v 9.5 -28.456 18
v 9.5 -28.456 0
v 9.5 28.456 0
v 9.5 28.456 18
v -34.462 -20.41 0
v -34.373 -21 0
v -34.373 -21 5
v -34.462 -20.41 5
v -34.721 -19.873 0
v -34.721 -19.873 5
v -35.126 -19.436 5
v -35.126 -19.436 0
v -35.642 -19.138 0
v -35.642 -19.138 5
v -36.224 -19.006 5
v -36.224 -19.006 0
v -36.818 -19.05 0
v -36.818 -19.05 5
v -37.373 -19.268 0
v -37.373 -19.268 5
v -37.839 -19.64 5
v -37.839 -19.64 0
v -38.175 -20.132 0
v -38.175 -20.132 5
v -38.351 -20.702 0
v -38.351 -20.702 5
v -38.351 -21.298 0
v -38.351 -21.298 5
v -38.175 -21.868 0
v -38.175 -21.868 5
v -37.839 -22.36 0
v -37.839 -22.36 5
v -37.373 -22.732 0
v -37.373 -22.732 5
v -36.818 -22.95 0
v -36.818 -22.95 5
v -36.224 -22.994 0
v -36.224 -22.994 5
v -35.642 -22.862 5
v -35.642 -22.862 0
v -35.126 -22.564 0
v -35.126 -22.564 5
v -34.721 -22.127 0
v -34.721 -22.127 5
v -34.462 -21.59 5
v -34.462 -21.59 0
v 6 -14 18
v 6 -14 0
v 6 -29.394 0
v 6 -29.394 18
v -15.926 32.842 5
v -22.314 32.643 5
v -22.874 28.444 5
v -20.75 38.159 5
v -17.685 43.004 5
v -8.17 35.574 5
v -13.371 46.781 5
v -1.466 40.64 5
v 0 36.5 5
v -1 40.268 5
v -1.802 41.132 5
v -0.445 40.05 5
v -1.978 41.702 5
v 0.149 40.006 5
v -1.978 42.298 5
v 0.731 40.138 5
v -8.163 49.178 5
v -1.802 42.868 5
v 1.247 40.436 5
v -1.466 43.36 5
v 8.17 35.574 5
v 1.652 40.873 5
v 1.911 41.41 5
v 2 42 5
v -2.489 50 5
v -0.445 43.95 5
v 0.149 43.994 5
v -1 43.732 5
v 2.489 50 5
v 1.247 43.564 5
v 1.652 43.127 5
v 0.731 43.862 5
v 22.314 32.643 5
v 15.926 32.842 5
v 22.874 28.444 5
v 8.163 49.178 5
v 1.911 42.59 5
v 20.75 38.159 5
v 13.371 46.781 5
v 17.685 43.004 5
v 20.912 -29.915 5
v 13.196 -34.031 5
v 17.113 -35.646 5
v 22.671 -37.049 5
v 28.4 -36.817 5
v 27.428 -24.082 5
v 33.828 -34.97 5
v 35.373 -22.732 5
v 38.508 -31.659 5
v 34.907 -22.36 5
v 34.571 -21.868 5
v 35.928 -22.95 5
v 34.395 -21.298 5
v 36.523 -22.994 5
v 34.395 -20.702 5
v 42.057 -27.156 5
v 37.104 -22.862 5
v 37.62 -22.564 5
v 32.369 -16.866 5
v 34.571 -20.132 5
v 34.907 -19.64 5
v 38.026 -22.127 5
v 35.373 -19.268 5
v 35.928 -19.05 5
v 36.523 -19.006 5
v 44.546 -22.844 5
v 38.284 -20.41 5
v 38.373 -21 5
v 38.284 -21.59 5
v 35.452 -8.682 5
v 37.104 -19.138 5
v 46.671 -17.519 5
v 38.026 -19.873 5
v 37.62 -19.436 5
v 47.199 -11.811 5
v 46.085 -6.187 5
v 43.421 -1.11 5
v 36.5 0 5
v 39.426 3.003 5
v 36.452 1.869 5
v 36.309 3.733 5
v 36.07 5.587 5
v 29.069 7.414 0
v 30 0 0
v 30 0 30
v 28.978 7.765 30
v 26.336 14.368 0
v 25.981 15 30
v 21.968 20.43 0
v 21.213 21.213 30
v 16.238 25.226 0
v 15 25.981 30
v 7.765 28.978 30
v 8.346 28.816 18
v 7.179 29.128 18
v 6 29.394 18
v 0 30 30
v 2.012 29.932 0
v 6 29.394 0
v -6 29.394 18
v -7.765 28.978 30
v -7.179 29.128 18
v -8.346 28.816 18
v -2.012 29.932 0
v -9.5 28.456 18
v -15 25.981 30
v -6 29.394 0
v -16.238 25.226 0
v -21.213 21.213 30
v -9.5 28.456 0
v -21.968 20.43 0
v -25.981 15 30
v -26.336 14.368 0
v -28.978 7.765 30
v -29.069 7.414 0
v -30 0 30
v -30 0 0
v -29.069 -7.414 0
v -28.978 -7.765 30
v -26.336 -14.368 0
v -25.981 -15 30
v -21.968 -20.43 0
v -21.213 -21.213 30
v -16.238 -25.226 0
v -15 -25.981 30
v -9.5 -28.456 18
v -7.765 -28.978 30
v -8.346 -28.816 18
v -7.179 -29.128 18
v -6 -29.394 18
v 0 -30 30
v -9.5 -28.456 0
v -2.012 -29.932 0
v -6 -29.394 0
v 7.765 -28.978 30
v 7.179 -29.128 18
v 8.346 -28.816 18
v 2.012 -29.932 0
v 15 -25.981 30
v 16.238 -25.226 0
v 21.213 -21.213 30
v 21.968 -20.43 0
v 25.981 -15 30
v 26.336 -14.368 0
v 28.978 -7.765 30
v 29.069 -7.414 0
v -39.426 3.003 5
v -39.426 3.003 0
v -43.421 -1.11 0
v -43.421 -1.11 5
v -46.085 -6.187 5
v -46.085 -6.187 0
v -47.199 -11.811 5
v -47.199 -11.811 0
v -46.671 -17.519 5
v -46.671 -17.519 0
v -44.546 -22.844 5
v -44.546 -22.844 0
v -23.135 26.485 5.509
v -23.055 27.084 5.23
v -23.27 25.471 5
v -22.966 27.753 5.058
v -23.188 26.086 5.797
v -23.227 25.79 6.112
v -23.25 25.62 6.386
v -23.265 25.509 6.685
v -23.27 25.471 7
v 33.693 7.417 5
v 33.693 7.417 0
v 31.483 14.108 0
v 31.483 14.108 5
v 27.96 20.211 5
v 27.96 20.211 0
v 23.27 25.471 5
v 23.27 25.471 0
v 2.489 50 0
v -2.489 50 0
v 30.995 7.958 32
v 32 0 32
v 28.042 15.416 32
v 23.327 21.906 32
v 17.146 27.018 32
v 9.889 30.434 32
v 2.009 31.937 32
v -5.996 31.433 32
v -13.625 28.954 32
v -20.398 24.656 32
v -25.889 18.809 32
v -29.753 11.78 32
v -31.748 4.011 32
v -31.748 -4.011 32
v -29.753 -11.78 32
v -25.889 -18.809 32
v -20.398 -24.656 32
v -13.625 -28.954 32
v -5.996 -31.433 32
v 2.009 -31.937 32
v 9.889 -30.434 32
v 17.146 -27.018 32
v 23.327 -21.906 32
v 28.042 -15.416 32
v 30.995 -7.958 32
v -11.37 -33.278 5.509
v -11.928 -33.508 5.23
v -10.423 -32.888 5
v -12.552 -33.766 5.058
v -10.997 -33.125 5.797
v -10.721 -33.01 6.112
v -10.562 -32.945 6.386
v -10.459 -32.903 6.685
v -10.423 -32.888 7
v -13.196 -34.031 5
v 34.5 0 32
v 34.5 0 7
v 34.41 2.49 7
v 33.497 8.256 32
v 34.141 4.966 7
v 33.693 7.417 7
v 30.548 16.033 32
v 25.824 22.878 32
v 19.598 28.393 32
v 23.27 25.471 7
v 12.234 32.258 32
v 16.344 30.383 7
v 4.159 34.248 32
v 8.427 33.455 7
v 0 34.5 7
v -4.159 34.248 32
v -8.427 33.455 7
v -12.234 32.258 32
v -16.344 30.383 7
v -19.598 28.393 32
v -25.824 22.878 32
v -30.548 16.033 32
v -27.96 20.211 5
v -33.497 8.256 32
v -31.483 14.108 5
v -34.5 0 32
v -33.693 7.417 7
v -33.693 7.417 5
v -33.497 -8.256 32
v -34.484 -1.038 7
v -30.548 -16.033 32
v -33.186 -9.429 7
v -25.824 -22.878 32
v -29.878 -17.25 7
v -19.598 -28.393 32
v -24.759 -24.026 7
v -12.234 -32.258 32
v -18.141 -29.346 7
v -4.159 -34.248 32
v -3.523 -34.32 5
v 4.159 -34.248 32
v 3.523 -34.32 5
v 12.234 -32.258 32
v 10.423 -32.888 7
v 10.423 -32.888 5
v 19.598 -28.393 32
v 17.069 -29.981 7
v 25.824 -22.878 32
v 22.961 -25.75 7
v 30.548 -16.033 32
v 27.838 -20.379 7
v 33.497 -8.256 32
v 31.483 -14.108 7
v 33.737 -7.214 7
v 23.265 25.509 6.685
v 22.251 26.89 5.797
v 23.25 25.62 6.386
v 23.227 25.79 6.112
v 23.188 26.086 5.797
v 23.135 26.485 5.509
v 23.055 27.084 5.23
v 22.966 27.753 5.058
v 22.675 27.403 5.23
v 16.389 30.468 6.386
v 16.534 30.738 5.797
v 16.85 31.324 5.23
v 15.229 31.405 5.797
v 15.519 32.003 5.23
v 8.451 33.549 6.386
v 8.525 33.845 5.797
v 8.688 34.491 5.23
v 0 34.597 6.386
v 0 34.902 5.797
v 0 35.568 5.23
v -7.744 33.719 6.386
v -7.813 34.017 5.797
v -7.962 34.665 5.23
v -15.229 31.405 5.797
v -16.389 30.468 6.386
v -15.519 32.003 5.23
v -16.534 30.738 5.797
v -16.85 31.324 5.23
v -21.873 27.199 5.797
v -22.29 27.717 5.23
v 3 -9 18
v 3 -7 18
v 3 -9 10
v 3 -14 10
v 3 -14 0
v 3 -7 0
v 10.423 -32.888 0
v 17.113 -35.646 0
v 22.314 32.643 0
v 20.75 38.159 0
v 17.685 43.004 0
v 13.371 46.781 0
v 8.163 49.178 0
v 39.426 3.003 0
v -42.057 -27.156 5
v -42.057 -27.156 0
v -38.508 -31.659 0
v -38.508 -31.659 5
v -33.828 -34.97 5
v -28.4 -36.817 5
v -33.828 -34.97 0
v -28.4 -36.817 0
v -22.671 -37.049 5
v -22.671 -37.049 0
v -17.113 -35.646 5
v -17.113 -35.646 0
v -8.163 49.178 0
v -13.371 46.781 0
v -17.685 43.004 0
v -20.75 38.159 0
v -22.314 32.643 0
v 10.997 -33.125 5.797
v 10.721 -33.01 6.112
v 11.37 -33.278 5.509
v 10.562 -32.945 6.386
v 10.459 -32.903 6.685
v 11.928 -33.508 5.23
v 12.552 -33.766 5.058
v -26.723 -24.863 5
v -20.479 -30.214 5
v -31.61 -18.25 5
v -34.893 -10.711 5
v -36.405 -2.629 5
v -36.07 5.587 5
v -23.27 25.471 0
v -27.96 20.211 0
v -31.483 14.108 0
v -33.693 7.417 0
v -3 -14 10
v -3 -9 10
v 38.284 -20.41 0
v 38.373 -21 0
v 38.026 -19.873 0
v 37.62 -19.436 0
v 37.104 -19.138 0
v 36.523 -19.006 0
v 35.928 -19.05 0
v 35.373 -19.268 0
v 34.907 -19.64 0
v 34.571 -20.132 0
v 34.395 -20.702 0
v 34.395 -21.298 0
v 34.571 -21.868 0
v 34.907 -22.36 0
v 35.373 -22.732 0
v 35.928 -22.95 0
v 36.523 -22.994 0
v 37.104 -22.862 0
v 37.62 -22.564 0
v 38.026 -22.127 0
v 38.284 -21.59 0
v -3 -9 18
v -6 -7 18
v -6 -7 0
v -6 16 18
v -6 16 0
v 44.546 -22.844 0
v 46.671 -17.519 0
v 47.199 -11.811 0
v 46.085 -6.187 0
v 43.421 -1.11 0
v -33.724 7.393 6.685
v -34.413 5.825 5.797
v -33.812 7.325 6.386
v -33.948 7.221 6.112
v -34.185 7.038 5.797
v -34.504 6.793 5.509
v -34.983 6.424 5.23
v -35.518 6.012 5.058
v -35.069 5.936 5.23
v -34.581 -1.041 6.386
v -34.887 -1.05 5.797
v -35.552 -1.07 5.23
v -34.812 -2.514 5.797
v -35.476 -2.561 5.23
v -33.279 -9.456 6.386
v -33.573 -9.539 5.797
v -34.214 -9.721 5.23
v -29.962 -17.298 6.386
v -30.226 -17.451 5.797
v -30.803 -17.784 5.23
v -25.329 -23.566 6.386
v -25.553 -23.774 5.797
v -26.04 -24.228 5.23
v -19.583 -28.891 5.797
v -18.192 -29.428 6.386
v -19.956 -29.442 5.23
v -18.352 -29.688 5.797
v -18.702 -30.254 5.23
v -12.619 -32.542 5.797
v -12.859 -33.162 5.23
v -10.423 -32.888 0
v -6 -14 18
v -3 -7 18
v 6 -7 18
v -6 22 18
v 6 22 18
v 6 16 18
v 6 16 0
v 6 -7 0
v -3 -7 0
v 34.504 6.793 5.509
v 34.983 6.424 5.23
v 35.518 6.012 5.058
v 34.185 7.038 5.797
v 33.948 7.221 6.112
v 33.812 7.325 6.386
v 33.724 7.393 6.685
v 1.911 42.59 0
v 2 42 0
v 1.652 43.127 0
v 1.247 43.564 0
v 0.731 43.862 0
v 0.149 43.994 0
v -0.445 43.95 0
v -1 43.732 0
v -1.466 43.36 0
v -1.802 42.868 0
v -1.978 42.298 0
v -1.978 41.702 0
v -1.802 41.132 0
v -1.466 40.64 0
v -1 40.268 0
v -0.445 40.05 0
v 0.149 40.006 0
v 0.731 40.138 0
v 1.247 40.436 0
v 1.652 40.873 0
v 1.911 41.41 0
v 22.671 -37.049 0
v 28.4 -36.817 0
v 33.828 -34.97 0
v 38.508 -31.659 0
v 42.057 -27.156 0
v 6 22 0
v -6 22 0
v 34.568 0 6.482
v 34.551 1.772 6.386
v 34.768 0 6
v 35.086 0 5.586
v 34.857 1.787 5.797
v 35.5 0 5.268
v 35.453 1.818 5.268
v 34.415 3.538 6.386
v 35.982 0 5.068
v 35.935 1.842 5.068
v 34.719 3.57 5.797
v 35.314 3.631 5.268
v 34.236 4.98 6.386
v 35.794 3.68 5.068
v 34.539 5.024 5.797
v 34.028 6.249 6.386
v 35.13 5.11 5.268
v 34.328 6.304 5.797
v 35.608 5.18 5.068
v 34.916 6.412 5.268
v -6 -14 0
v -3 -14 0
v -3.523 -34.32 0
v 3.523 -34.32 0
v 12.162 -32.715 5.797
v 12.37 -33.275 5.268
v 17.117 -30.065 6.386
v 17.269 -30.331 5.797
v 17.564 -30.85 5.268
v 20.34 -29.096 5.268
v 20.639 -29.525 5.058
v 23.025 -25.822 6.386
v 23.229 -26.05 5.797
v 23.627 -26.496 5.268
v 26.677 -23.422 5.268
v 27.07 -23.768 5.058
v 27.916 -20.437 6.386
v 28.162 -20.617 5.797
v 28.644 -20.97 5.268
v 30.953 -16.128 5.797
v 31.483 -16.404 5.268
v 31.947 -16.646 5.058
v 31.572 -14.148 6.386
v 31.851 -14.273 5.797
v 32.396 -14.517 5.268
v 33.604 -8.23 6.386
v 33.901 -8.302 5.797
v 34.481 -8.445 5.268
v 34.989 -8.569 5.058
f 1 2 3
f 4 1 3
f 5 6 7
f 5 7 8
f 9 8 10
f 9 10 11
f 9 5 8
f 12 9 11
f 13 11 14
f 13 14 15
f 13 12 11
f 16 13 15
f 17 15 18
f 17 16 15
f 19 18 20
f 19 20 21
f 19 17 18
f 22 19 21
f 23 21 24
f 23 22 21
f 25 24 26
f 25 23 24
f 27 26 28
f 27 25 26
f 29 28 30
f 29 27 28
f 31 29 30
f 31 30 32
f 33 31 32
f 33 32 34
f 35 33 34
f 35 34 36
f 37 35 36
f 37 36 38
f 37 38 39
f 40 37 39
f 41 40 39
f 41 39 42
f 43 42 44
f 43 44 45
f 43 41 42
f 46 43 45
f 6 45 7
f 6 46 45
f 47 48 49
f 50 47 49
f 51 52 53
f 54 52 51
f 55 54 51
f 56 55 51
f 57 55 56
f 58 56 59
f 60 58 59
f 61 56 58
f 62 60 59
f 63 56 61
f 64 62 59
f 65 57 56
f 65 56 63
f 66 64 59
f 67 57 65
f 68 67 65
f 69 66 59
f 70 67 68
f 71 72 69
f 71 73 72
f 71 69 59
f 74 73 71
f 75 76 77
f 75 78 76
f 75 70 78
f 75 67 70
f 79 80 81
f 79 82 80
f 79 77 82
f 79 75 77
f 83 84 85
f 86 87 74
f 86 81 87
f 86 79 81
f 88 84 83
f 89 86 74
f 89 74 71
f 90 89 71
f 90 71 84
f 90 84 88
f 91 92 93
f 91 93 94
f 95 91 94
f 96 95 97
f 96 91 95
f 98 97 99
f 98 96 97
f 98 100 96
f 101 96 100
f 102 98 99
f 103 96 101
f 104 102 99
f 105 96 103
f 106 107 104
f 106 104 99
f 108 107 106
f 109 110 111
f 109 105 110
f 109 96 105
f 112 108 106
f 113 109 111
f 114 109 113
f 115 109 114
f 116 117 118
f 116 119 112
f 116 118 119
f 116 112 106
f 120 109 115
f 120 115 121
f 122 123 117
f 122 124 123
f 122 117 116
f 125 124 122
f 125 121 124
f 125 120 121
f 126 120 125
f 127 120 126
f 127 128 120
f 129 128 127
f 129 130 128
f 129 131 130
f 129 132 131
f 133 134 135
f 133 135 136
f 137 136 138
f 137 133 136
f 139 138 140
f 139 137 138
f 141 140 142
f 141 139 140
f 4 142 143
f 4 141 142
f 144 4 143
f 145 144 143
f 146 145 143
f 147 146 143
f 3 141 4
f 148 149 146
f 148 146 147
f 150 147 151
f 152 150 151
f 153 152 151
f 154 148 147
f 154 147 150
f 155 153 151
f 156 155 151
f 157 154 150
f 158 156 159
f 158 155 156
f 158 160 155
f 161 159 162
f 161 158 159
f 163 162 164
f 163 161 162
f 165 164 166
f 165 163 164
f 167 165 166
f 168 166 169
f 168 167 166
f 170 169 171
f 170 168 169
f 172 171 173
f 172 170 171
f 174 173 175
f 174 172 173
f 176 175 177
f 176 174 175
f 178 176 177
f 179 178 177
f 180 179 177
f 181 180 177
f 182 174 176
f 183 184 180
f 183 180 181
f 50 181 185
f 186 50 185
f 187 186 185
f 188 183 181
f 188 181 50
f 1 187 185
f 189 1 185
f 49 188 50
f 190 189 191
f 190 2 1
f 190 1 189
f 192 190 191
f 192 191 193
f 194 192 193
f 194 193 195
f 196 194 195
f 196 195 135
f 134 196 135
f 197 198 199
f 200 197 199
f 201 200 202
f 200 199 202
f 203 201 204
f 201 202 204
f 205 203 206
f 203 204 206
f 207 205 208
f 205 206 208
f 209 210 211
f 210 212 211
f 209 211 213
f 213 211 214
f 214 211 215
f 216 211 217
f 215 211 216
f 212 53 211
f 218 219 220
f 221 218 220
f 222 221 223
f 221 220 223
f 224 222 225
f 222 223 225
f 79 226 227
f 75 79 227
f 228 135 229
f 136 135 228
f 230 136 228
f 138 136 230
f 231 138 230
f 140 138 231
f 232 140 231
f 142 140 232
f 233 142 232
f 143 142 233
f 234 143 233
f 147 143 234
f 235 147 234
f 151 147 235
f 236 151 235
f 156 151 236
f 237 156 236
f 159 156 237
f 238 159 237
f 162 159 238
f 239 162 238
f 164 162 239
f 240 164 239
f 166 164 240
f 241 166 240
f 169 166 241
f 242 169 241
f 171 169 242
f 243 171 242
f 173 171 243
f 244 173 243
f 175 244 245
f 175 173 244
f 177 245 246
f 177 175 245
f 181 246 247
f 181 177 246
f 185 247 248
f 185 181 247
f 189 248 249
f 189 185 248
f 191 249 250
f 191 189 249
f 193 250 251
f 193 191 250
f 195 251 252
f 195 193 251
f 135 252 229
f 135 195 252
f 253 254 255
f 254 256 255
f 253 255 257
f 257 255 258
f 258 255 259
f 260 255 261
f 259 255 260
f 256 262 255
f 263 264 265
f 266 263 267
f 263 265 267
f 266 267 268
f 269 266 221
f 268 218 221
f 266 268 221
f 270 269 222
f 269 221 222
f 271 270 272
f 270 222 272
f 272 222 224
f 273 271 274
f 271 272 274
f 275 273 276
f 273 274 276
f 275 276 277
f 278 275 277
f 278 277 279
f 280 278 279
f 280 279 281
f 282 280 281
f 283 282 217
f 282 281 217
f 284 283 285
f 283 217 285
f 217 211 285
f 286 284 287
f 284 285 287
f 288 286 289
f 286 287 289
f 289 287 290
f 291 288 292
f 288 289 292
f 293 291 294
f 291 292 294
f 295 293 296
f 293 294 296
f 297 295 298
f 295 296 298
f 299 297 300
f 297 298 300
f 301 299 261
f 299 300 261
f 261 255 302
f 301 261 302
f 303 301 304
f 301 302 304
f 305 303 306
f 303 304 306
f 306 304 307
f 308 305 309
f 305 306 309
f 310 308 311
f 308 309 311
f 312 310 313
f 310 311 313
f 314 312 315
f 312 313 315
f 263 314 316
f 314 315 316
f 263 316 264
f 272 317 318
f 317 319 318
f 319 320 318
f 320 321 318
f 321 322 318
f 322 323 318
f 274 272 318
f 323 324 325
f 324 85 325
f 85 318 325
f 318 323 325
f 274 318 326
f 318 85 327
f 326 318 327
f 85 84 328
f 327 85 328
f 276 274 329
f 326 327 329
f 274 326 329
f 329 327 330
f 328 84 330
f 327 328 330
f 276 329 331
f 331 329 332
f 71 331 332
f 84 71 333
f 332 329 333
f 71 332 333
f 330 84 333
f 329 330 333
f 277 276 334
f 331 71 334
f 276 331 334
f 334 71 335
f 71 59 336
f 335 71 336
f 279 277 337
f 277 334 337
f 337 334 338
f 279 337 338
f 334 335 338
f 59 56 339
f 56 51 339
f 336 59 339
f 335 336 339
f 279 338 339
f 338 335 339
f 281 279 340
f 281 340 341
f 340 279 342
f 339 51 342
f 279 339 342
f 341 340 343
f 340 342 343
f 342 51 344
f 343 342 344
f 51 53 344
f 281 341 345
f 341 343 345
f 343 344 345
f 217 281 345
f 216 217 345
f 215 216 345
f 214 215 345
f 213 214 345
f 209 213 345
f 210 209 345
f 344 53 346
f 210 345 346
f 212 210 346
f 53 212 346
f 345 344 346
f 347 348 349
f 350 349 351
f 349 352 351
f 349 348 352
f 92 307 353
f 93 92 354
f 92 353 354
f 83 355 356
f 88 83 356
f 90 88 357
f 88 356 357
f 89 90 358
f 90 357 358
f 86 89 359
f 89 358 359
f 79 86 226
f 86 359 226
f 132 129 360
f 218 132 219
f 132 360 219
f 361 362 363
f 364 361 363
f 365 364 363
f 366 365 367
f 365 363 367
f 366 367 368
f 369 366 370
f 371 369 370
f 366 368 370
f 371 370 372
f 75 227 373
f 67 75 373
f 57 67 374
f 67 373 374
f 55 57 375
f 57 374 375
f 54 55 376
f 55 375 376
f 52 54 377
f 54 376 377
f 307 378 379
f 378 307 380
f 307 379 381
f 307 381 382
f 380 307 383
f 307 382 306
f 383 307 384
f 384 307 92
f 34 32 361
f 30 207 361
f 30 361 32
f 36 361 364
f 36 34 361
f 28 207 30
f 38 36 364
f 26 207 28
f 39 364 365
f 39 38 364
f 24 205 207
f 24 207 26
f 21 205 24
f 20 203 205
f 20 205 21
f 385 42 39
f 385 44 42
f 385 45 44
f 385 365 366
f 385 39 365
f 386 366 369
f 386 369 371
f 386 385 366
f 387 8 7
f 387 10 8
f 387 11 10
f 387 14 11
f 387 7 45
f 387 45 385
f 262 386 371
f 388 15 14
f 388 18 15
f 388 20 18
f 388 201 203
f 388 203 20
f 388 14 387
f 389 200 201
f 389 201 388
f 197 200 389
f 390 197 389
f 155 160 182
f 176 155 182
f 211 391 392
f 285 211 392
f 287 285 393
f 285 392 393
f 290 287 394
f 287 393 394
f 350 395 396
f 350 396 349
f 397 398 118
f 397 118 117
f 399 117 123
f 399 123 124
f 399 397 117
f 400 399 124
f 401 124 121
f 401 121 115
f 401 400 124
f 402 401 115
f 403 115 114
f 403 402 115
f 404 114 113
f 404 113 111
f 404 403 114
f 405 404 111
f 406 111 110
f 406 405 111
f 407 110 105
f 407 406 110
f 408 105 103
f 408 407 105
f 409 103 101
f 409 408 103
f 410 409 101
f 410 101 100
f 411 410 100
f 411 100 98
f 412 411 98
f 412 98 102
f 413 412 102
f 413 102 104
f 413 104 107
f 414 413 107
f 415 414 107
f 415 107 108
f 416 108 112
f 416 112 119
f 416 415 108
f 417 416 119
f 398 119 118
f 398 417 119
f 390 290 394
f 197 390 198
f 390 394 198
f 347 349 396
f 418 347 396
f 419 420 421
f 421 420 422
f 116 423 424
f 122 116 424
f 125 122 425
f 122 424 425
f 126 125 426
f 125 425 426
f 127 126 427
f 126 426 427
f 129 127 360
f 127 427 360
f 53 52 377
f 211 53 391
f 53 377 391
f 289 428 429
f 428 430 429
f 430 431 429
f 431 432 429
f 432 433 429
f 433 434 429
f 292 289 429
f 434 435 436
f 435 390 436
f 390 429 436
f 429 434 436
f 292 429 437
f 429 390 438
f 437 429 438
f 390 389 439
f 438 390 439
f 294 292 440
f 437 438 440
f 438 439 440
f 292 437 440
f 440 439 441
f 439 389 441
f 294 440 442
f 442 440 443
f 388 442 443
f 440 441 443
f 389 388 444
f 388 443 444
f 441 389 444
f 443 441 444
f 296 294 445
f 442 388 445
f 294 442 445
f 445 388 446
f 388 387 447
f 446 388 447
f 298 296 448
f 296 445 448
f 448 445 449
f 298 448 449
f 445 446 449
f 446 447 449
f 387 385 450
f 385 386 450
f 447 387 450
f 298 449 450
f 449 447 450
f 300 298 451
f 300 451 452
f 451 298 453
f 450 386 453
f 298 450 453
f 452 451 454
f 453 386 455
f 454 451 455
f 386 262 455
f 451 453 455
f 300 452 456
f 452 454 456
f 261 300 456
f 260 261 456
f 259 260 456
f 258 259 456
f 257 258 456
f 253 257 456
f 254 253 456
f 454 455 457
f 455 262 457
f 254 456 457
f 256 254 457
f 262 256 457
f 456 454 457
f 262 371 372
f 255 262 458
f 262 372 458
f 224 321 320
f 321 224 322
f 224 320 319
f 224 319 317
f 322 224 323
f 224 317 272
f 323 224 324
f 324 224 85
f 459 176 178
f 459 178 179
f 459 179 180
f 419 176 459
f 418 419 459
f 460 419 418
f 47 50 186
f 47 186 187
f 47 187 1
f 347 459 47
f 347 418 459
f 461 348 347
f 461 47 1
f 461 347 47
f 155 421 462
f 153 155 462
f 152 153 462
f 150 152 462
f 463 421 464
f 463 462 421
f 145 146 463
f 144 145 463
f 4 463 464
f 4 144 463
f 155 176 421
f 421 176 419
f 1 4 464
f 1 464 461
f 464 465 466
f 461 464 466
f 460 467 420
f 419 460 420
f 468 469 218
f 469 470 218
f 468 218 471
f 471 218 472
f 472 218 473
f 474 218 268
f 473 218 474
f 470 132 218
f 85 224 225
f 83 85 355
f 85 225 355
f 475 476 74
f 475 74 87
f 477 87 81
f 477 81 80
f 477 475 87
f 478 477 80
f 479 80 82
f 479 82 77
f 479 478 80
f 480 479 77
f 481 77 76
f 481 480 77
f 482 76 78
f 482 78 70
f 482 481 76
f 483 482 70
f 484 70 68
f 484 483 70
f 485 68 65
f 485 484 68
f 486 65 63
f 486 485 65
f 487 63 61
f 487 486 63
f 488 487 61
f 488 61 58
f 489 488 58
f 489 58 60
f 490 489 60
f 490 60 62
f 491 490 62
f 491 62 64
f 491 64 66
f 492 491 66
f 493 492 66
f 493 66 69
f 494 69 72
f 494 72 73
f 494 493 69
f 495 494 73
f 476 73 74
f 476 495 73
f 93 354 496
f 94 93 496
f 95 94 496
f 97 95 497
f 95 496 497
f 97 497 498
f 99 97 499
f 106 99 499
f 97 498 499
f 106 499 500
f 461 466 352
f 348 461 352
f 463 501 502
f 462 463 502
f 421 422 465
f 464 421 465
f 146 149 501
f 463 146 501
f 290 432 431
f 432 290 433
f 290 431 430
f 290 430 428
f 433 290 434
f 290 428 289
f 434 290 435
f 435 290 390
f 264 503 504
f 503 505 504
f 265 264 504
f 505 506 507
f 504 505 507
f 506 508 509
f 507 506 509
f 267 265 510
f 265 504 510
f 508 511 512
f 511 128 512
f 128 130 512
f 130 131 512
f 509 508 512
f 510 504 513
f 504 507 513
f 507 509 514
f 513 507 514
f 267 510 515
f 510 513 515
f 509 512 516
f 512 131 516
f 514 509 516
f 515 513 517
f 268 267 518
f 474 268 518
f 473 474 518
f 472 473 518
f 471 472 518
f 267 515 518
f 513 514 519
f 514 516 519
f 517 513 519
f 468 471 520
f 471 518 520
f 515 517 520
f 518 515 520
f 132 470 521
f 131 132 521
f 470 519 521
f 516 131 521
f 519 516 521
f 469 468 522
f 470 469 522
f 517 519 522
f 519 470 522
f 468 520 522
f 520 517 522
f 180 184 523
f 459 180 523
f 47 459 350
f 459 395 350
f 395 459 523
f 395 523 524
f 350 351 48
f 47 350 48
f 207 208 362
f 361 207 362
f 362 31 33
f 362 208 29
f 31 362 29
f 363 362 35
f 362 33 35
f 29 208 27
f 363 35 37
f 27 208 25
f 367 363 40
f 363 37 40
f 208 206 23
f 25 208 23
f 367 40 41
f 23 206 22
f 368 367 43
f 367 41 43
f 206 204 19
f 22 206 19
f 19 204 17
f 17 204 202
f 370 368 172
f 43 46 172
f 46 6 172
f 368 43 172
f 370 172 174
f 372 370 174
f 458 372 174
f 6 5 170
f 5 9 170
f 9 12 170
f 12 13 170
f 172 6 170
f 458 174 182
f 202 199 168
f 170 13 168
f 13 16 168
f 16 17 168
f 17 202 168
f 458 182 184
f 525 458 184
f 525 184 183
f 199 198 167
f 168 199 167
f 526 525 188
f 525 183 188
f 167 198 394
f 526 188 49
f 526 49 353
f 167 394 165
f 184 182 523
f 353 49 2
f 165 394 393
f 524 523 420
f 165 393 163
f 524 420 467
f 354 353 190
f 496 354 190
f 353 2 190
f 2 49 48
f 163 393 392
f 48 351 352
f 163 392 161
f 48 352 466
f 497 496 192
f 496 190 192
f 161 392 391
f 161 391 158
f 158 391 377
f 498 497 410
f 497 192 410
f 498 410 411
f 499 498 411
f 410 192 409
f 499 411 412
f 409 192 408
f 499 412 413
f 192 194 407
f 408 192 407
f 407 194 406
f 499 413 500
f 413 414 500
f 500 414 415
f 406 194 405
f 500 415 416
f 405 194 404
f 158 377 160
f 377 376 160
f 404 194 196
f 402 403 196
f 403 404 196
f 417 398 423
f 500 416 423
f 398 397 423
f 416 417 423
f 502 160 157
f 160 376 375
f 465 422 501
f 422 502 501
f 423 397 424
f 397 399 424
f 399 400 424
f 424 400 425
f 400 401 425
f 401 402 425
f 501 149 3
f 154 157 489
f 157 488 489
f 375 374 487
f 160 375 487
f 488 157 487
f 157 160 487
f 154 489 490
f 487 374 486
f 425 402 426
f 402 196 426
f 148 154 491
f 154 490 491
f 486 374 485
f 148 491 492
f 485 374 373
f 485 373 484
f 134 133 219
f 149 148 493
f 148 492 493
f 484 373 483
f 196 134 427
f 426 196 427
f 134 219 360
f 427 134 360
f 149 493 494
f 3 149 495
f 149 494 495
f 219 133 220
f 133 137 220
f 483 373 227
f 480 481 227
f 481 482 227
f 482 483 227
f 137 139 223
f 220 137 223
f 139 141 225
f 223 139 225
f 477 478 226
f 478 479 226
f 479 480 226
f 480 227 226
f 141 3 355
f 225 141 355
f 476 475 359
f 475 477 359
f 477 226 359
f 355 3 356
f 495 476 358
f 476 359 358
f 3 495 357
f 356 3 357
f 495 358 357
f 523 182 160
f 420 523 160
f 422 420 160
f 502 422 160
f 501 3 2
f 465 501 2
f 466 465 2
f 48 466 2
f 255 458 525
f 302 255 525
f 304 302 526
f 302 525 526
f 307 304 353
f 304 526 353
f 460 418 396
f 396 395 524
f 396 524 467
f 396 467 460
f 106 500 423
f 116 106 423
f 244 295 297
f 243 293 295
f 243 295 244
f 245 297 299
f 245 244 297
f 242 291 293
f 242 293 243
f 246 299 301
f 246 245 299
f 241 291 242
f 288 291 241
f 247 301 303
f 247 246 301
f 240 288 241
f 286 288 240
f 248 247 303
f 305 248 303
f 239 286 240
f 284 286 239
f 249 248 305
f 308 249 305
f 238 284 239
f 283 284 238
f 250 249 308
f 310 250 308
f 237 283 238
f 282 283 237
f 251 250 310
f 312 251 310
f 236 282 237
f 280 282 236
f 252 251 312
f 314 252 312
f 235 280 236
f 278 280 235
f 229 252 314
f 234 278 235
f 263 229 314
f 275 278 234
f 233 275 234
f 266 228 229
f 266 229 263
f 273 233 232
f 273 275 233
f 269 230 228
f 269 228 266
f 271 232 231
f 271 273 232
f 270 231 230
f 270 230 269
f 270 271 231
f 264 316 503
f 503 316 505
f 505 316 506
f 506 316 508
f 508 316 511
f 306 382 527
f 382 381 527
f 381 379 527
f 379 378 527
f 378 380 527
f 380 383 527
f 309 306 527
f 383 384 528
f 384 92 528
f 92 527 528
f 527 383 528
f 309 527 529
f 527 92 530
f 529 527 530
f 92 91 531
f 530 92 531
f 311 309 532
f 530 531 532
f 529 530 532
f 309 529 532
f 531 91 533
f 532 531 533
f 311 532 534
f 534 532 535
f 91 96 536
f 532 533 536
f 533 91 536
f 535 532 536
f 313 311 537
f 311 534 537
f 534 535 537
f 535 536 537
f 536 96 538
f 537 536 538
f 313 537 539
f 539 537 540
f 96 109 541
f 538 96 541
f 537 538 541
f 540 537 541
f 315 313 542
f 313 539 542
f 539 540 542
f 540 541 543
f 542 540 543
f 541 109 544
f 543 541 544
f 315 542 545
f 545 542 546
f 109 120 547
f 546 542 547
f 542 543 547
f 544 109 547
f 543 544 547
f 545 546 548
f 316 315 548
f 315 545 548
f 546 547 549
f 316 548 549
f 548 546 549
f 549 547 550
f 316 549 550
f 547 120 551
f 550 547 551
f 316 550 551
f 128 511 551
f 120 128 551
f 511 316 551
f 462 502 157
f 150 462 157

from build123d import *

# Parameters (mm, degrees)
F0_R         = 2
F0_R_2       = 30
F1_DEPTH     = 5
F2_R         = 34.5
F2_R_2       = 30
F3_DEPTH     = 27
F5_DEPTH     = 18
F6_SIZE      = 2
F7_T4_ANGLE  = 101.4429805126
F7_T10_ANGLE = 101.4429805126
F7_T16_ANGLE = 20.718590379
F7_T21_ANGLE = 80.7206862136
F8_W         = 6
F8_H         = 5
F9_DEPTH     = 10


# Not quite as in the source:
# - a fillet or chamfer that OpenCascade refuses, or shapes differently, is made with other operations: its cross-section is extruded or revolved along the edge and cut away or added


with BuildPart() as f1:
    # F0 (on Top) → F1 (new body)
    with BuildSketch(Plane.XY):
        with BuildLine():
            Line((2.4892725641, 50), (-2.4892725641, 50))
            ThreePointArc((-2.4892725641, 50), (-15.663935341, 45.0475333764), (-22.31389035, 32.6428260715))
            Line((-22.31389035, 32.6428260715), (-23.2700083459, 25.4707030052))
            ThreePointArc((-23.2700083459, 25.4707030052), (-29.8778764306, 17.25), (-33.6932800277, 7.4170668712))
            Line((-33.6932800277, 7.4170668712), (-39.4264618042, 3.0029828646))
            ThreePointArc((-39.4264618042, 3.0029828646), (-46.8442759523, -8.9584007597), (-44.5459064713, -22.8442267226))
            Line((-44.5459064713, -22.8442267226), (-42.0566339072, -27.1557732774))
            ThreePointArc((-42.0566339072, -27.1557732774), (-31.1803406113, -36.0891326167), (-17.1125714543, -35.6458089361))
            Line((-17.1125714543, -35.6458089361), (-10.4232716818, -32.8877698765))
            ThreePointArc((-10.4232716818, -32.8877698765), (0, -34.5), (10.4232716818, -32.8877698765))
            Line((10.4232716818, -32.8877698765), (17.1125714543, -35.6458089361))
            ThreePointArc((17.1125714543, -35.6458089361), (31.1803406113, -36.0891326167), (42.0566339072, -27.1557732774))
            Line((42.0566339072, -27.1557732774), (44.5459064713, -22.8442267226))
            ThreePointArc((44.5459064713, -22.8442267226), (46.8442759523, -8.9584007597), (39.4264618042, 3.0029828646))
            Line((39.4264618042, 3.0029828646), (33.6932800277, 7.4170668712))
            ThreePointArc((33.6932800277, 7.4170668712), (29.8778764306, 17.25), (23.2700083459, 25.4707030052))
            Line((23.2700083459, 25.4707030052), (22.31389035, 32.6428260715))
            ThreePointArc((22.31389035, 32.6428260715), (15.663935341, 45.0475333764), (2.4892725641, 50))
        make_face()
        with Locations((-36.3730669589, -21)):
            Circle(F0_R, mode=Mode.SUBTRACT)
        with Locations((36.3730669589, -21)):
            Circle(F0_R, mode=Mode.SUBTRACT)
        Circle(F0_R_2, mode=Mode.SUBTRACT)
        with Locations((0, 42)):
            Circle(F0_R, mode=Mode.SUBTRACT)
    extrude(amount=F1_DEPTH)

    # F2 (on face) → F3 (join)
    with BuildSketch(Plane.XY.offset(5)):
        Circle(F2_R)
        Circle(F2_R_2, mode=Mode.SUBTRACT)
    extrude(amount=F3_DEPTH)

    # F4 (on Top) → F5 (join)
    with BuildSketch(Plane.XY):
        with BuildLine():
            Line((9.5, 0), (9.5, 28.4561065503))
            ThreePointArc((9.5, 28.4561065503), (7.7641711286, 28.9778820255), (6, 29.3938769134))
            Line((6, 29.3938769134), (6, 22))
            Line((6, 22), (0, 22))
            Line((0, 22), (-6, 22))
            Line((-6, 22), (-6, 29.3938769134))
            ThreePointArc((-6, 29.3938769134), (-7.7641711286, 28.9778820255), (-9.5, 28.4561065503))
            Line((-9.5, 28.4561065503), (-9.5, 0))
            Line((-9.5, 0), (-9.5, -28.4561065503))
            ThreePointArc((-9.5, -28.4561065503), (-7.7641711286, -28.9778820255), (-6, -29.3938769134))
            Line((-6, -29.3938769134), (-6, -14))
            Line((-6, -14), (-6, -9))
            Line((-6, -9), (-6, -7))
            Line((-6, -7), (-6, 16))
            Line((-6, 16), (0, 16))
            Line((0, 16), (6, 16))
            Line((6, 16), (6, -7))
            Line((6, -7), (6, -9))
            Line((6, -9), (6, -14))
            Line((6, -14), (6, -29.3938769134))
            ThreePointArc((6, -29.3938769134), (7.7641711286, -28.9778820255), (9.5, -28.4561065503))
            Line((9.5, -28.4561065503), (9.5, 0))
        make_face()
        Polygon((0, -14), (6, -14), (6, -9), (6, -7), (3, -7), (3, -9), (-3, -9), (-3, -7), (-6, -7), (-6, -9), (-6, -14), align=None)
    extrude(amount=F5_DEPTH)

    # F6
    f6_edges = [f1.edges().sort_by_distance(p)[0] for p in [
        (-30, 0, 32),
    ]]
    chamfer(f6_edges, length=F6_SIZE)

    # F7: fillet of radius 2 on 3 edges, made by hand


with BuildPart() as f7_tool2:
    # F7_s3 → F7_t4 (revolve)
    with BuildSketch(Plane(origin=(0, 0, 0), x_dir=(0, 0, 1), z_dir=(0.3538256813, 0.9353113852, 0))):
        with BuildLine():
            ThreePointArc((7, -34.5), (5.5857864376, -35.0857864376), (5, -36.5))
            Line((5, -36.5), (5, -34.5))
            Line((5, -34.5), (7, -34.5))
        make_face()
    revolve(axis=Axis((0, 0, 5), (0, 0, 1)), revolution_arc=F7_T4_ANGLE)

    split(bisect_by=Plane(origin=(-16.1247319925, 20.9434209841, 0), x_dir=(0, 0, 1), z_dir=(0.6100531704, -0.7923604794, 0)), keep=Keep.TOP)

    split(bisect_by=Plane(origin=(10.0751686181, -24.4361380268, 0), x_dir=(0, 0, 1), z_dir=(-0.3811777189, 0.9245017829, 0)), keep=Keep.TOP)


with BuildPart() as f1_1:
    add(f1.part)

    # F7_t1: union F7_tool2
    add(f7_tool2.part)


with BuildPart() as f7_tool8:
    # F7_s9 → F7_t10 (revolve)
    with BuildSketch(Plane(origin=(0, 0, 0), x_dir=(0, 0, 1), z_dir=(0.6330905794, -0.7740777211, 0))):
        with BuildLine():
            ThreePointArc((7, -34.5), (5.5857864376, -35.0857864376), (5, -36.5))
            Line((5, -36.5), (5, -34.5))
            Line((5, -34.5), (7, -34.5))
        make_face()
    revolve(axis=Axis((0, 0, 5), (0, 0, 1)), revolution_arc=F7_T10_ANGLE)

    split(bisect_by=Plane(origin=(-26.1999006106, 3.4927170427, 0), x_dir=(0, 0, 1), z_dir=(0.9912308893, -0.1321413036, 0)), keep=Keep.TOP)

    split(bisect_by=Plane(origin=(26.1999006106, 3.4927170427, 0), x_dir=(0, 0, 1), z_dir=(-0.9912308893, -0.1321413036, 0)), keep=Keep.TOP)


with BuildPart() as f1_2:
    add(f1_1.part)

    # F7_t7: union F7_tool8
    add(f7_tool8.part)


with BuildPart() as f7_tool14:
    # F7_s15 → F7_t16 (revolve)
    with BuildSketch(Plane.XZ):
        with BuildLine():
            ThreePointArc((34.5, 7), (35.0857864376, 5.5857864376), (36.5, 5))
            Line((36.5, 5), (34.5, 5))
            Line((34.5, 5), (34.5, 7))
        make_face()
    revolve(axis=Axis((0, 0, 5), (0, 0, 1)), revolution_arc=F7_T16_ANGLE)

    split(bisect_by=Plane(origin=(16.1247319925, 20.9434209841, 0), x_dir=(0, 0, 1), z_dir=(-0.6100531704, -0.7923604794, 0)), keep=Keep.TOP)


with BuildPart() as f1_3:
    add(f1_2.part)

    # F7_t13: union F7_tool14
    add(f7_tool14.part)


with BuildPart() as f7_tool19:
    # F7_s20 → F7_t21 (revolve)
    with BuildSketch(Plane(origin=(0, 0, 0), x_dir=(0, 0, 1), z_dir=(-0.9869139979, -0.1612475137, 0))):
        with BuildLine():
            ThreePointArc((7, -34.5), (5.5857864376, -35.0857864376), (5, -36.5))
            Line((5, -36.5), (5, -34.5))
            Line((5, -34.5), (7, -34.5))
        make_face()
    revolve(axis=Axis((0, 0, 5), (0, 0, 1)), revolution_arc=F7_T21_ANGLE)

    split(bisect_by=Plane(origin=(-10.0751686181, -24.4361380268, 0), x_dir=(0, 0, 1), z_dir=(0.3811777189, 0.9245017829, 0)), keep=Keep.TOP)


with BuildPart() as f1_4:
    add(f1_3.part)

    # F7_t18: union F7_tool19
    add(f7_tool19.part)

    # F8 (on face) → F9 (cut)
    with BuildSketch(Plane(origin=(0, 0, 0), x_dir=(1, 0, 0), z_dir=(0, 0, -1))):
        with Locations((0, 11.5)):
            Rectangle(F8_W, F8_H)
    extrude(amount=-F9_DEPTH, mode=Mode.SUBTRACT)


solid = f1_4.part
